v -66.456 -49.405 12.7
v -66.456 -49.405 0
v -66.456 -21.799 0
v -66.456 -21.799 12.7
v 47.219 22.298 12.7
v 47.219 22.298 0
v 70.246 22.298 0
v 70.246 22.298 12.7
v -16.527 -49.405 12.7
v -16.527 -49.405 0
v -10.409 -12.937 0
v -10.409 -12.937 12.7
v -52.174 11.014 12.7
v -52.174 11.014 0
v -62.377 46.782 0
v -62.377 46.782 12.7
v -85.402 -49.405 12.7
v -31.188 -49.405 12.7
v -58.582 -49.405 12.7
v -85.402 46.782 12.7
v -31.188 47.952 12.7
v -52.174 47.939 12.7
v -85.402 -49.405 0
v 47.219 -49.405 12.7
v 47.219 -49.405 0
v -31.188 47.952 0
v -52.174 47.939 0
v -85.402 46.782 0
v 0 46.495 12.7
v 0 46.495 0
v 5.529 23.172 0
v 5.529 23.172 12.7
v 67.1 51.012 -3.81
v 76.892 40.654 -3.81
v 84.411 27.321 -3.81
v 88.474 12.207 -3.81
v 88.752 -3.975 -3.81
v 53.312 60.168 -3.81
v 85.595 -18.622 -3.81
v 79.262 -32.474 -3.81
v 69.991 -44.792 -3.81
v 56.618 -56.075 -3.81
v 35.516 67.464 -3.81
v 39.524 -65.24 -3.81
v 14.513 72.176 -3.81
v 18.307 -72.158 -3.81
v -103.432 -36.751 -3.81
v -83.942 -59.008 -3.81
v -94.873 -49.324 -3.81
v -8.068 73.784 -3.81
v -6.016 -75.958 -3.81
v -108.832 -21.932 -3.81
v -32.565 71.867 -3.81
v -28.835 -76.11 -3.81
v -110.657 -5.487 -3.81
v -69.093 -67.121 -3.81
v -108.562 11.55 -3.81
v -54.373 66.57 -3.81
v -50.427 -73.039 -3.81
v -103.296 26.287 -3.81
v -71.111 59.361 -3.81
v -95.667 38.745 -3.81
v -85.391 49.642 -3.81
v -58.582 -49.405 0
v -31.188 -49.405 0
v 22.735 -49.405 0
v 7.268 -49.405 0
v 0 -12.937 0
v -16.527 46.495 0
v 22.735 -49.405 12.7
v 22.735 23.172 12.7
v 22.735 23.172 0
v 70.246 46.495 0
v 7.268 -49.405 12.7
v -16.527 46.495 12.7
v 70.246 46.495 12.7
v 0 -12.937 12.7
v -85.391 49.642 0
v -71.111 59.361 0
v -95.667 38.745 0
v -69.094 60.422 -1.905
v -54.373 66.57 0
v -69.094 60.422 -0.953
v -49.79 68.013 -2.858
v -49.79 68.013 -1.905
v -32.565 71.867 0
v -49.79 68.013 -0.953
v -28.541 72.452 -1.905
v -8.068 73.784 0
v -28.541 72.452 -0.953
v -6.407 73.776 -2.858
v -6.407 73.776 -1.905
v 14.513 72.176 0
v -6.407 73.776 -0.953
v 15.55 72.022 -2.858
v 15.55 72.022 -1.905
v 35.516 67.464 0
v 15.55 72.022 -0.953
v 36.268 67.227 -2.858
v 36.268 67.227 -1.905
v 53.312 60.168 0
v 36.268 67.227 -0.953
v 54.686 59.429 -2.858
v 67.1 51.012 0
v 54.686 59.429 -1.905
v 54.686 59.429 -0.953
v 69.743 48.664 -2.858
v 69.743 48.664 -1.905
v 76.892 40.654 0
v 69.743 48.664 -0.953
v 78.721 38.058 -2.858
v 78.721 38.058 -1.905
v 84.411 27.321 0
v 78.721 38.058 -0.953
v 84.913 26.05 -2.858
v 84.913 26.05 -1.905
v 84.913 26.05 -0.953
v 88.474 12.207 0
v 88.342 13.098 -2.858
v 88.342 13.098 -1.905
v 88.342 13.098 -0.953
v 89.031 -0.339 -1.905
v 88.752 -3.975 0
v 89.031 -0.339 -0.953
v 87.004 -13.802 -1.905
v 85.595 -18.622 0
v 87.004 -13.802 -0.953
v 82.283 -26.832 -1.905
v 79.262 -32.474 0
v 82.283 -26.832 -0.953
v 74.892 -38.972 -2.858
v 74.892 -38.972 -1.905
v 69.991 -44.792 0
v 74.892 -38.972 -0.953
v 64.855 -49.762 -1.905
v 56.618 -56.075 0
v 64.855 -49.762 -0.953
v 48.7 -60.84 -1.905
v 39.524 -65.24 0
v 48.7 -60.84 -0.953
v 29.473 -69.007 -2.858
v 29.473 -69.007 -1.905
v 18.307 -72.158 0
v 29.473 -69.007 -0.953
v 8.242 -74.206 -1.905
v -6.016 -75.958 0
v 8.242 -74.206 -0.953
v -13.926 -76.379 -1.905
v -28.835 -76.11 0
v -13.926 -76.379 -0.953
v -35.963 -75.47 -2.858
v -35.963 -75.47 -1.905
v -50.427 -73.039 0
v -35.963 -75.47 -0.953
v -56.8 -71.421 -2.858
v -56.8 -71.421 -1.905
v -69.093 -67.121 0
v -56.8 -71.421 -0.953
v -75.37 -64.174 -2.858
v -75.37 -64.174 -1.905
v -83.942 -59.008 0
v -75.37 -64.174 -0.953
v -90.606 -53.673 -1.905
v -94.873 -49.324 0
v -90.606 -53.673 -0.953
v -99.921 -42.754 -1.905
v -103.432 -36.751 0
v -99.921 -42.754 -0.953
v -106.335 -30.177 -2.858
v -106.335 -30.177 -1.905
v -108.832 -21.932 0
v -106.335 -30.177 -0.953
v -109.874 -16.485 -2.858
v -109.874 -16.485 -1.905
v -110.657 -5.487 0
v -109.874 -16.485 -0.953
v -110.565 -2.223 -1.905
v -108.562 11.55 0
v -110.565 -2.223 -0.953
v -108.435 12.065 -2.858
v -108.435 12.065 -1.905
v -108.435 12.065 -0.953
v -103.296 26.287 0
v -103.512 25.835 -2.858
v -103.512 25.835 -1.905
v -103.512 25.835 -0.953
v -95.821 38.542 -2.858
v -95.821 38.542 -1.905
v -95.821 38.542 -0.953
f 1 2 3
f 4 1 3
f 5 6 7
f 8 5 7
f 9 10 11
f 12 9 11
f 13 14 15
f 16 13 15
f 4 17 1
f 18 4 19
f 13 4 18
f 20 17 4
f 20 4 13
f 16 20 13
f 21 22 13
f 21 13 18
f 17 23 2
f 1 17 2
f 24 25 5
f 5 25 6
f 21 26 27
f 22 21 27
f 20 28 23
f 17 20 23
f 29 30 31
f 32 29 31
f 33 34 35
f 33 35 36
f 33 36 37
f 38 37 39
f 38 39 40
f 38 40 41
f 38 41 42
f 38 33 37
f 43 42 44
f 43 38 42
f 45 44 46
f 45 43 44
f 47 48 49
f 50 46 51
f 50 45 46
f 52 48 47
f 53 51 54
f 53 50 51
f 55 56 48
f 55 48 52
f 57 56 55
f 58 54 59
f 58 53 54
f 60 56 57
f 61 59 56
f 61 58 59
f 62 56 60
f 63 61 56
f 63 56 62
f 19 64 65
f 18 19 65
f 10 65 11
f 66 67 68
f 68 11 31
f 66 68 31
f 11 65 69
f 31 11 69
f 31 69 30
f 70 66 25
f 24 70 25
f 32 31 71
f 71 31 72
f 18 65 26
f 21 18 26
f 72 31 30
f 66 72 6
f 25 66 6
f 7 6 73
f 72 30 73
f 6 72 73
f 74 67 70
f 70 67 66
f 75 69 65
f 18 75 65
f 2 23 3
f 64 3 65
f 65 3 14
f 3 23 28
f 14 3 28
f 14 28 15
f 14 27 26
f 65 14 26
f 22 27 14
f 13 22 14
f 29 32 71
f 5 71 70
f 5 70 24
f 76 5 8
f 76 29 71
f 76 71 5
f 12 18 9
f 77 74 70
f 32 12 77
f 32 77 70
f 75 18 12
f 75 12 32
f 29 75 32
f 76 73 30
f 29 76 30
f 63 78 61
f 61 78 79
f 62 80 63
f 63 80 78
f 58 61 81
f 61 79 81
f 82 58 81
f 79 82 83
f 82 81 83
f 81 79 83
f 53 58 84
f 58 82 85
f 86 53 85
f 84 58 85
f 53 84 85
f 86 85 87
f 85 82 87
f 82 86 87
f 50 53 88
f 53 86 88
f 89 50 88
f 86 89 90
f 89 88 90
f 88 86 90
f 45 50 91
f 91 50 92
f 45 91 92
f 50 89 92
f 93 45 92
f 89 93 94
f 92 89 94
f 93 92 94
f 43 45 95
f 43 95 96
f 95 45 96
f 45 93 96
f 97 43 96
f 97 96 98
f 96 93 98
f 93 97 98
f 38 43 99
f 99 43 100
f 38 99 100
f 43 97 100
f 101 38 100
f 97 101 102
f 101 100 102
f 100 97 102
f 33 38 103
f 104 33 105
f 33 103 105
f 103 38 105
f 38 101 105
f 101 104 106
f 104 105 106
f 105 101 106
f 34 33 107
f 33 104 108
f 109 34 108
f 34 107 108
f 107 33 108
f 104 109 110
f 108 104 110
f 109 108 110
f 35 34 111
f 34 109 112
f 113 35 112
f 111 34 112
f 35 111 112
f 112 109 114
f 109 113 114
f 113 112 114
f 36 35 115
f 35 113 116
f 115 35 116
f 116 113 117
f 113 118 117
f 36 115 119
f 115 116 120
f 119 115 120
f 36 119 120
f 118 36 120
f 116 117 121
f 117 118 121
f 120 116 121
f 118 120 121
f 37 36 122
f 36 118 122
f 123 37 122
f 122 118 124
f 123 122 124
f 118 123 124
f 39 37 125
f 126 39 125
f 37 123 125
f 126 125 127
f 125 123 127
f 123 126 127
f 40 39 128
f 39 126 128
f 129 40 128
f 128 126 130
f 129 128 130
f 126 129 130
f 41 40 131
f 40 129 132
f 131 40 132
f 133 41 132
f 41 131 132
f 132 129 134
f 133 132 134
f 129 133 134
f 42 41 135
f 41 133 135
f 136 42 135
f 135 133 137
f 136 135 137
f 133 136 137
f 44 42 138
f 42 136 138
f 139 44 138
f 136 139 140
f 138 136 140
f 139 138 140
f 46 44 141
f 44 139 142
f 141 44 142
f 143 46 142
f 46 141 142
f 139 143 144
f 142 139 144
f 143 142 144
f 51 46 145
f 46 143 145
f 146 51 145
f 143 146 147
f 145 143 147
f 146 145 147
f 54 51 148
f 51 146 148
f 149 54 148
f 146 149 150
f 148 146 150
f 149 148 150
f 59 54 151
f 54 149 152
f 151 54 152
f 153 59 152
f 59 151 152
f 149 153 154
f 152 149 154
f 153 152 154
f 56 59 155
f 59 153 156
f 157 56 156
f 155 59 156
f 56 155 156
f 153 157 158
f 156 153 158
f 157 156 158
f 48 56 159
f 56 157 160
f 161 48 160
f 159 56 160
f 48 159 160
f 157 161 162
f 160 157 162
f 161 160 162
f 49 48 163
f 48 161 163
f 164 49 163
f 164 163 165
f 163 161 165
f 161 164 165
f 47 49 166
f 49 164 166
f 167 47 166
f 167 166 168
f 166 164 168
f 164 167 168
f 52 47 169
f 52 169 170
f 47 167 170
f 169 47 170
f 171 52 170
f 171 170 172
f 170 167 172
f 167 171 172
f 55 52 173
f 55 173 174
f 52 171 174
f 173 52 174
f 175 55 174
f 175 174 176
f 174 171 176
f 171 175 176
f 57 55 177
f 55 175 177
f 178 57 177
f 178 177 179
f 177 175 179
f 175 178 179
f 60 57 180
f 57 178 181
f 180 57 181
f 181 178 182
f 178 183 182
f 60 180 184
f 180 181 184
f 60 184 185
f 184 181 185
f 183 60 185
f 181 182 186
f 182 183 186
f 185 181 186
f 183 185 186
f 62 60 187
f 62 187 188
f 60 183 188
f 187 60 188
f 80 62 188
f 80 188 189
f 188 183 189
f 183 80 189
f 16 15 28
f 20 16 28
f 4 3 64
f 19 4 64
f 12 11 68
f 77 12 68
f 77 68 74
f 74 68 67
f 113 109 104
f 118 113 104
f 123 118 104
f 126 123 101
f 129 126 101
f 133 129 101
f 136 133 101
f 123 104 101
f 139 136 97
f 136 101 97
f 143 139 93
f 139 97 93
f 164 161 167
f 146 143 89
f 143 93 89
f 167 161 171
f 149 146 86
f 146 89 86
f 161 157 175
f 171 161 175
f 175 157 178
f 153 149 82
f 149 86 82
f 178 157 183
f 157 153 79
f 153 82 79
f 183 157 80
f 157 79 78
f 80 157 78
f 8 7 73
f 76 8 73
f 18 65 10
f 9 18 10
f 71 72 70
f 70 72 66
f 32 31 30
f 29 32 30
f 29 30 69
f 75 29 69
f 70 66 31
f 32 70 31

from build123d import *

# Parameters (mm, degrees)
F1_DEPTH = 12.7
F2_DEPTH = 12.7
F3_DEPTH = 12.7
F5_DEPTH = 3.81


with BuildPart() as f1:
    # F0 (on Top) → F1 (new body)
    with BuildSketch(Plane.XY):
        Polygon((-62.3766927527, 46.7818044126), (-85.4022949934, 46.7818044126), (-85.4022949934, -49.4050830603), (-66.4563924074, -49.4050830603), (-66.4563924074, -21.7987033878), (-58.5817858567, -49.4050830603), (-31.1882905662, -49.4050830603), (-31.1882905662, 47.9516349733), (-52.1740950644, 47.9387719753), (-52.1740950644, 11.0140763851), align=None)
    extrude(amount=F1_DEPTH)


with BuildPart() as f2:
    # F0 (on Top) → F2 (new body)
    with BuildSketch(Plane.XY):
        Polygon((-16.5267791777, 46.4949570596), (-31.1882905662, -49.4050830603), (-16.5267791777, -49.4050830603), (-10.4087405084, -12.9374125972), (0, -12.9374125972), (7.2679491714, -49.4050830603), (22.7350816131, -49.4050830603), (5.529117934, 23.172294721), (0, 46.4949570596), align=None)
    extrude(amount=F2_DEPTH)


with BuildPart() as f3:
    # F0 (on Top) → F3 (new body)
    with BuildSketch(Plane.XY):
        Polygon((70.2455714345, 46.4949570596), (0, 46.4949570596), (5.529117934, 23.172294721), (22.7350816131, 23.172294721), (22.7350816131, -49.4050830603), (47.2190156579, -49.4050830603), (47.2190156579, 22.2978685051), (70.2455714345, 22.2978685051), align=None)
    extrude(amount=F3_DEPTH)


with BuildPart() as f5:
    # F4 (on Top) → F5 (new body)
    with BuildSketch(Plane.XY):
        with BuildLine():
            add(Edge.make_bspline(
                [(-85.391163826, 49.6416091919), (-46.8853315452, 82.6738491482), (100.2935157759, 80.1917747796), (92.2543776844, -80.7983461048), (-122.4135911437, -88.458973036), (-116.8342090122, 22.6681832969), (-85.391163826, 49.6416091919)],
                knots=[0, 0, 0, 0, 0.2766415471, 0.4971273403, 0.7741003856, 1, 1, 1, 1], degree=3))
        make_face()
    extrude(amount=-F5_DEPTH)


solid = Compound([f1.part, f2.part, f3.part, f5.part])
